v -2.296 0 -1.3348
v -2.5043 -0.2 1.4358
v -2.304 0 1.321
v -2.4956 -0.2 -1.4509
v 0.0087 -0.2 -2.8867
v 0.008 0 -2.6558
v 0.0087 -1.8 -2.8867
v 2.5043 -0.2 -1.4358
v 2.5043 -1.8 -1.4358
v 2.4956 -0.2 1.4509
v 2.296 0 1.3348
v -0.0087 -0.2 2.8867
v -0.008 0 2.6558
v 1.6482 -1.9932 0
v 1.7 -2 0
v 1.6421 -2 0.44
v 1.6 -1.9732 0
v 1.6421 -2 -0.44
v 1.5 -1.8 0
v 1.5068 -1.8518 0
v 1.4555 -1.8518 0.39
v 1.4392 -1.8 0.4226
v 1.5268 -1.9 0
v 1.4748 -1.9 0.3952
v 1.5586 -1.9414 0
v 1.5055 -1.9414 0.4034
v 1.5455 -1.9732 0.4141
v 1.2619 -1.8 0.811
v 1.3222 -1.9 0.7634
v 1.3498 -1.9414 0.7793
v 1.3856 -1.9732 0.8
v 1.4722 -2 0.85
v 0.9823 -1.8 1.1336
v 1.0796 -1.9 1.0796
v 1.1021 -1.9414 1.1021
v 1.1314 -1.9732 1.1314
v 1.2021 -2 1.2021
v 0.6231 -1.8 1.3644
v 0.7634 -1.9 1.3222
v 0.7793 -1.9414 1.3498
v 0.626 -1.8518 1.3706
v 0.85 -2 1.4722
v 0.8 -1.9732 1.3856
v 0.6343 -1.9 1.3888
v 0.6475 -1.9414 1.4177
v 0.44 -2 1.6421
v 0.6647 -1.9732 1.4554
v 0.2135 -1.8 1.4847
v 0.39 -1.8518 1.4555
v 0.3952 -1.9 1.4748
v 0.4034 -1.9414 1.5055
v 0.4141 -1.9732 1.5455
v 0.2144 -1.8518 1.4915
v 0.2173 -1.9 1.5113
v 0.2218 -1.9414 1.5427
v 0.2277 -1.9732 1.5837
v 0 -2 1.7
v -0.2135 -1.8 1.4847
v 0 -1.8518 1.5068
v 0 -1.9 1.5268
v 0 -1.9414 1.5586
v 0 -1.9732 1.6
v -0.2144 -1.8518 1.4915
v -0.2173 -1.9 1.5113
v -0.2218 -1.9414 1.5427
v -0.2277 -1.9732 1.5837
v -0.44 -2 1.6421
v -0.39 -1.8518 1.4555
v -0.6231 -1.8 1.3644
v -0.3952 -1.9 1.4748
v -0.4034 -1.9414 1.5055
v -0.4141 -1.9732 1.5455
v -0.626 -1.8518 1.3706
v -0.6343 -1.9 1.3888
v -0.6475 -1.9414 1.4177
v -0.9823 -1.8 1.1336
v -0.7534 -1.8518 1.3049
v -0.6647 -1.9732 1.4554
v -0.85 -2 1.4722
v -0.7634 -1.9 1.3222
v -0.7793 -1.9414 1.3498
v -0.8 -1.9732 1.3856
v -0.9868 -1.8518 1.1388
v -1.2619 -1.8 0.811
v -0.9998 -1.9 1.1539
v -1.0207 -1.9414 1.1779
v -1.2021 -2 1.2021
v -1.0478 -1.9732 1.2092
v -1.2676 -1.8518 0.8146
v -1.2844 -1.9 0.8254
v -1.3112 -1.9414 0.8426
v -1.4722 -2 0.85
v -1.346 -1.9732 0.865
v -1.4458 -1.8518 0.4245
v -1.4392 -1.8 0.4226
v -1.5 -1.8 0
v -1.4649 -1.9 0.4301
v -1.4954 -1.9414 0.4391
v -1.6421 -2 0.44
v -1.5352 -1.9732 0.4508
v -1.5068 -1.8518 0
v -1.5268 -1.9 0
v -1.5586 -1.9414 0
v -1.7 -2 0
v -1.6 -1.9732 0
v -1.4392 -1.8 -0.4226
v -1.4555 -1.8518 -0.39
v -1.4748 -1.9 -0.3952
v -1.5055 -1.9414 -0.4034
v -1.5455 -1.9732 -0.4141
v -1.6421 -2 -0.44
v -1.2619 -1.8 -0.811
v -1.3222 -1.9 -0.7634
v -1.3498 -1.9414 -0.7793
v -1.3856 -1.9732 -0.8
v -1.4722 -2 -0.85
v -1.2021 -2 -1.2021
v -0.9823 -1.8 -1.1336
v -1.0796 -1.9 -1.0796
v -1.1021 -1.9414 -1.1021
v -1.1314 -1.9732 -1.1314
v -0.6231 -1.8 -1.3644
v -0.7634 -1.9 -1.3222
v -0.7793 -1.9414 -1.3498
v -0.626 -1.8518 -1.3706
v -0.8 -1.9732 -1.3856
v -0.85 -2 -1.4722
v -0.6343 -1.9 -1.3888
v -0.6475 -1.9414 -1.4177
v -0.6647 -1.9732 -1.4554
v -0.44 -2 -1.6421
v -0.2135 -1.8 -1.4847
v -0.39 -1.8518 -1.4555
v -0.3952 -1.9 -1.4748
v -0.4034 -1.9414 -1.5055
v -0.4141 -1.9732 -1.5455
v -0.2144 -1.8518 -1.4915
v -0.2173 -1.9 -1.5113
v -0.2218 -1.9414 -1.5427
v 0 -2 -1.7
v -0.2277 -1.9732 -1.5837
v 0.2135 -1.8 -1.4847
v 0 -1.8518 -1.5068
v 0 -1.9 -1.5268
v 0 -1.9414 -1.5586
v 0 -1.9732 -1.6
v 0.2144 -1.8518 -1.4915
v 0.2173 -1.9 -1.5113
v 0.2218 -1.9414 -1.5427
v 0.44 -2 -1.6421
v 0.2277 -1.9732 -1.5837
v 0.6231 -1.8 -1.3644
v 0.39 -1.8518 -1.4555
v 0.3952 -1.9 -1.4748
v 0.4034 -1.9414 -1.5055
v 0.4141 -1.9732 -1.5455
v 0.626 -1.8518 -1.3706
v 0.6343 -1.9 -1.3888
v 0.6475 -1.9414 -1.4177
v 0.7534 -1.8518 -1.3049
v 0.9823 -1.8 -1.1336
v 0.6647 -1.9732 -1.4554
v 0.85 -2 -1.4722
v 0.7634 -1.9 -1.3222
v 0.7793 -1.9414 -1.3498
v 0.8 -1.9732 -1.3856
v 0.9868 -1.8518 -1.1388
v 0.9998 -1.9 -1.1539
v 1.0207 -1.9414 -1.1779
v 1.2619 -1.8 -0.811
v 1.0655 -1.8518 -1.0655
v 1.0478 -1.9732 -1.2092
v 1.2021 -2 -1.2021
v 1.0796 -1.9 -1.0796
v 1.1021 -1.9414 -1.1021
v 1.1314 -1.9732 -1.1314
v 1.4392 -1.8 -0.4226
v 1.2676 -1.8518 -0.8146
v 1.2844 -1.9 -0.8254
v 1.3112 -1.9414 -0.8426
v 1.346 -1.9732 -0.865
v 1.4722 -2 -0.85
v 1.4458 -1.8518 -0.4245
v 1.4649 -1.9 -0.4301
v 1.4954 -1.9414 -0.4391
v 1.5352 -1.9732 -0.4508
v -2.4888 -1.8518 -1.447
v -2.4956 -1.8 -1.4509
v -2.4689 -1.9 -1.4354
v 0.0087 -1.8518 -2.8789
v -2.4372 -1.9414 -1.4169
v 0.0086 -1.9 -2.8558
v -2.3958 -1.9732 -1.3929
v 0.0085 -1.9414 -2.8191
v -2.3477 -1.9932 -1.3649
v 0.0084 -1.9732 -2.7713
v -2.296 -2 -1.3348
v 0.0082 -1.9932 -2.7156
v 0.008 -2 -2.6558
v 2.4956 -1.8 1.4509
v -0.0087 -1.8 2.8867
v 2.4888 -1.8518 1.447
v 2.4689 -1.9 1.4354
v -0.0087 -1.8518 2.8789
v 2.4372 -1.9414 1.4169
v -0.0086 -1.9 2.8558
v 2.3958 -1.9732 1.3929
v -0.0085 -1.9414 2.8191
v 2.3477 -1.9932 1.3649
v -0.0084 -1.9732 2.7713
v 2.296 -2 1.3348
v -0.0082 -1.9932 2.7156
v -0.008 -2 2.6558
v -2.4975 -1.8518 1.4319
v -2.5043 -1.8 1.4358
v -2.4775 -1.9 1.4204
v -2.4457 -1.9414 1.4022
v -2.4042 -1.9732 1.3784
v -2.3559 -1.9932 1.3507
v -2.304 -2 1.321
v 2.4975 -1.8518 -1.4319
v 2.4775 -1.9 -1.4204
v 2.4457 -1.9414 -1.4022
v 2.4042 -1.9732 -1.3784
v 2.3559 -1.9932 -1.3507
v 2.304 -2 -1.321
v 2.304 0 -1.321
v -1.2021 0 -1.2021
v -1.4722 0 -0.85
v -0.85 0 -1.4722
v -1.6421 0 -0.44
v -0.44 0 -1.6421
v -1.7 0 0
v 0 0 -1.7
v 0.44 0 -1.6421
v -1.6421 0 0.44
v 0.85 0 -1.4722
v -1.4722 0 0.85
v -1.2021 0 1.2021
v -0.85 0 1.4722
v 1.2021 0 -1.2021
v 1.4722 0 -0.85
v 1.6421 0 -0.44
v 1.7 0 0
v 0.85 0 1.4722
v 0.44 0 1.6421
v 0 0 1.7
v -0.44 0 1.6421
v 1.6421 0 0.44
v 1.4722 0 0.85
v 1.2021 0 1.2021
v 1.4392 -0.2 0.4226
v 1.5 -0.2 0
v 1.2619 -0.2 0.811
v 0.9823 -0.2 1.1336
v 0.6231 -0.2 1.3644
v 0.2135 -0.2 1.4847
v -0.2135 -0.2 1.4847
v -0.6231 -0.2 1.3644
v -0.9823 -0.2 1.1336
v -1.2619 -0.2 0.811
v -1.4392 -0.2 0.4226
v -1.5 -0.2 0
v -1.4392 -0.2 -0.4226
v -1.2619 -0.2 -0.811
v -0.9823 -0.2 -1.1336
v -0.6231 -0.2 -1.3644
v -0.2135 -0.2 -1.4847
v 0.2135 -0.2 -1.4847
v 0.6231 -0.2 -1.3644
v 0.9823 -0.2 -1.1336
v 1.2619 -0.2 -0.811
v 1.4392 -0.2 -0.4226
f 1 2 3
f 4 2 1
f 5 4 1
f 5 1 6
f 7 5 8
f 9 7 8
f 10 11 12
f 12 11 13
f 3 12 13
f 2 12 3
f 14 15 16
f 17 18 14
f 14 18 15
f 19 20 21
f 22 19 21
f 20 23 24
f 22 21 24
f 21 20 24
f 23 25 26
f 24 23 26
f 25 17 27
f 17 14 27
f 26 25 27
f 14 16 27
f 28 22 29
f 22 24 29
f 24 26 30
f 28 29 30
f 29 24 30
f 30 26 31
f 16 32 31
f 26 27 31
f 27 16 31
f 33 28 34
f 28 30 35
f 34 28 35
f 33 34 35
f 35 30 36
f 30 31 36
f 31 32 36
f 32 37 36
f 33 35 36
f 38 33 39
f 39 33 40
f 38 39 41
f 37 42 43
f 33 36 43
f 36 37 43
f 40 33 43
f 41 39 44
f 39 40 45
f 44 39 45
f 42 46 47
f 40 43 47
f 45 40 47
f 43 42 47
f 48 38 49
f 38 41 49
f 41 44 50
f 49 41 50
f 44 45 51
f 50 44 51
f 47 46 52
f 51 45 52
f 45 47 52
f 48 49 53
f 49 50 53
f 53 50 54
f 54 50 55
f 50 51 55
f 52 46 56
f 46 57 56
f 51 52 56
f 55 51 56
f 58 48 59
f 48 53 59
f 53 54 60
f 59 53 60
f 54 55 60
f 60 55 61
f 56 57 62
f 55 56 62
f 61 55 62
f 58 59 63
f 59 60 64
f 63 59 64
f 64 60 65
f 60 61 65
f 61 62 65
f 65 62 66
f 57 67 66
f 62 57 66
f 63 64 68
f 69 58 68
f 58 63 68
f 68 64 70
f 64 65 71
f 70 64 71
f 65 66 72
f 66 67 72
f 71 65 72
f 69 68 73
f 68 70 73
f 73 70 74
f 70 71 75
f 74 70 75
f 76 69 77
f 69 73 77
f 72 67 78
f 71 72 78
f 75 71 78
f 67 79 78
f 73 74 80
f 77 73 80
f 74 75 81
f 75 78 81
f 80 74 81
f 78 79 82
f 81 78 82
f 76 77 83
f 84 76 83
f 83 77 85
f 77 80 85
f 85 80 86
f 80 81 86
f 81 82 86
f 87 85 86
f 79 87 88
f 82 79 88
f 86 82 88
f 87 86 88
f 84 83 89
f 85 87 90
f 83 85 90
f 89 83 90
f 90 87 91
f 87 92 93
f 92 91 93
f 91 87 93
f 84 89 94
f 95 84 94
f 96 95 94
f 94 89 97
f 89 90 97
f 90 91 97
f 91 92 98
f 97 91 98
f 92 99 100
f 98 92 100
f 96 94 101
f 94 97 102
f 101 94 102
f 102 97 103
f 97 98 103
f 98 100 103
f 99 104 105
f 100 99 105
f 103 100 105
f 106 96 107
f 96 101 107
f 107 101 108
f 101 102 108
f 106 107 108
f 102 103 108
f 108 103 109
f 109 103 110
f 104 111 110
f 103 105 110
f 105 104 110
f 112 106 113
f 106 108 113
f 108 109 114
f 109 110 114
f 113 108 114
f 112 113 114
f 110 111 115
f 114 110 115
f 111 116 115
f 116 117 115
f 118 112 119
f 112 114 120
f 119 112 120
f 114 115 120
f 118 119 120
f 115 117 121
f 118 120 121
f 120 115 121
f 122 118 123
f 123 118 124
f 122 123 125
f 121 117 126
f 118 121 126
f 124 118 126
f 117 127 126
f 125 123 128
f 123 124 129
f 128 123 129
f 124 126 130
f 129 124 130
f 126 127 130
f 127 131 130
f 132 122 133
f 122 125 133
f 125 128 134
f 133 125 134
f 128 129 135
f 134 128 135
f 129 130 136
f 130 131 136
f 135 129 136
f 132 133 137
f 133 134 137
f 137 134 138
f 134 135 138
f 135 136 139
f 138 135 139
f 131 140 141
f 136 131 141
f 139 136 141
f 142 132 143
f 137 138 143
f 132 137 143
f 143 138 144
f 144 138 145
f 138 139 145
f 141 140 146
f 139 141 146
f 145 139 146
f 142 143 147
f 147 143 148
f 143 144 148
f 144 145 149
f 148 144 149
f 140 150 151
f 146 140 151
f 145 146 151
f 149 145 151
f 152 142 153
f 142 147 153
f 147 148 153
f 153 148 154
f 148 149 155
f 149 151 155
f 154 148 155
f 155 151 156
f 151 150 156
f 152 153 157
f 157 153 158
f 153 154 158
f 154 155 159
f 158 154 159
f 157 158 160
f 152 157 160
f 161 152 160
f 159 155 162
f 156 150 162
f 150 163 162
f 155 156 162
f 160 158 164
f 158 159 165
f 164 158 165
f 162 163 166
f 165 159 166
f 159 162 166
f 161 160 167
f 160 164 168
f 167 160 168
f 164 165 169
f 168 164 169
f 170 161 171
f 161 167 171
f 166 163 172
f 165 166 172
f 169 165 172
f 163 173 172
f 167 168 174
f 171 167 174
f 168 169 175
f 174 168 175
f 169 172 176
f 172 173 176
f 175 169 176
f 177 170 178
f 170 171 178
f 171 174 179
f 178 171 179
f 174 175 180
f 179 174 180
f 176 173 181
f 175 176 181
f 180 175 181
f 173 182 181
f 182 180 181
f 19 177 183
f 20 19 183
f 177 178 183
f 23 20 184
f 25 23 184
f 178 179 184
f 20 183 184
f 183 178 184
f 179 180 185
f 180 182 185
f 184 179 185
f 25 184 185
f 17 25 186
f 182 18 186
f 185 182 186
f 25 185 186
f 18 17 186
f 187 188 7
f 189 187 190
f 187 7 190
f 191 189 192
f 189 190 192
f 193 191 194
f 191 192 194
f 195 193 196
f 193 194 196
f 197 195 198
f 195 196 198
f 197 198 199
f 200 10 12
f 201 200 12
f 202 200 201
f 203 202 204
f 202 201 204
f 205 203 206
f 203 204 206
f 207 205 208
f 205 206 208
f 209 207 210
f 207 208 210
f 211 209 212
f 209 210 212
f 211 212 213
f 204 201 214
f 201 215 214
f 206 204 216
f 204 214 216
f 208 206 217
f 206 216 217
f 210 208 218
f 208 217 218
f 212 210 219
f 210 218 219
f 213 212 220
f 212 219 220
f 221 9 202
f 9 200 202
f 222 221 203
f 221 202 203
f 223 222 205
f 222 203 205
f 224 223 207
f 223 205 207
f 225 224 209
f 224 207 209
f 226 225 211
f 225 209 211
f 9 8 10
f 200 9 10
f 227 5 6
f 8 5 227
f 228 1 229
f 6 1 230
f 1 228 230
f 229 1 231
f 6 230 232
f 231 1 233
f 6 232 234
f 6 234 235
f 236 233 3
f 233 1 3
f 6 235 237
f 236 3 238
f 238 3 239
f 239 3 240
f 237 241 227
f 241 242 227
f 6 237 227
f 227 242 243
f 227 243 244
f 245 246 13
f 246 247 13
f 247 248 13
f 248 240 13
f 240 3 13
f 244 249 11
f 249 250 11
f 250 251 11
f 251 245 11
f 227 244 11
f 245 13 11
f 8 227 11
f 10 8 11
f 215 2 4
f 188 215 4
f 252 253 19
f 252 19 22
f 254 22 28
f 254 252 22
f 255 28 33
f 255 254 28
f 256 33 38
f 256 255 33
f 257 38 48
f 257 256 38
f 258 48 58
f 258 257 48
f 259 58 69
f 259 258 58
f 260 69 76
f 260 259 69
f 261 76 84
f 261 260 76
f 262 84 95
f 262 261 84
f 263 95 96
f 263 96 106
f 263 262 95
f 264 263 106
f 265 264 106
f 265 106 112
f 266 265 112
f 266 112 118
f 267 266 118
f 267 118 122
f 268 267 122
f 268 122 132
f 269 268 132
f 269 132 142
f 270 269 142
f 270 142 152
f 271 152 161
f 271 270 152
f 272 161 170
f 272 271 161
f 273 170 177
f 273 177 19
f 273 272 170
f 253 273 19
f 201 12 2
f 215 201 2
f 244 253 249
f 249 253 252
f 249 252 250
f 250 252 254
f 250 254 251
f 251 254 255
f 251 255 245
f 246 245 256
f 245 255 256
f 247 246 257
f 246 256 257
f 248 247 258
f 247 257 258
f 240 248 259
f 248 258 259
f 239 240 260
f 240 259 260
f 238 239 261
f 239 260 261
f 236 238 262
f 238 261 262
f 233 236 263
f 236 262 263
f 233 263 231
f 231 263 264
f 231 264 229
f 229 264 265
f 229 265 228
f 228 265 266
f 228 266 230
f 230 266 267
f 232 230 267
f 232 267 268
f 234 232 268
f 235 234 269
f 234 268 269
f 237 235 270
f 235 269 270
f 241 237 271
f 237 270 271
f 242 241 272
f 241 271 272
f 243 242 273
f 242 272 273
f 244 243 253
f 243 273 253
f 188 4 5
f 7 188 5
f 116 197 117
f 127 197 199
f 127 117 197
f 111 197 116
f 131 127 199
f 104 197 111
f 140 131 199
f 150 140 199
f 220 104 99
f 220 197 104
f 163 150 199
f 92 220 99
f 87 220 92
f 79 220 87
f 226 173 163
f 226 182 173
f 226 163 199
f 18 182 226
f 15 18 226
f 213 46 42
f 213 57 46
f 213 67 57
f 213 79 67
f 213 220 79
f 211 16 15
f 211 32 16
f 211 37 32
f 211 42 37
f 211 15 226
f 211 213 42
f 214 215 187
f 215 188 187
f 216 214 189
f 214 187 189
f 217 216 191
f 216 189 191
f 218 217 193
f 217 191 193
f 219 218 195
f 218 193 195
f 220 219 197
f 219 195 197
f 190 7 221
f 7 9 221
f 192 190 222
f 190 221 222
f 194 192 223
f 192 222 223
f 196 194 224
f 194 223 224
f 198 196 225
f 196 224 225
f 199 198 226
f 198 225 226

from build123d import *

# Parameters (mm, degrees)
F0_R     = 1.5
F1_DEPTH = 2
F2_R     = 0.2
F3_SIZE  = 0.2


with BuildPart() as f1:
    # F0 (on Front) → F1 (new body)
    with BuildSketch(Plane.XZ):
        Polygon((2.495633, 1.450914), (-0.008712, 2.886738), (-2.504345, 1.435824), (-2.495633, -1.450914), (0.008712, -2.886738), (2.504345, -1.435824), align=None)
        Circle(F0_R, mode=Mode.SUBTRACT)
    extrude(amount=F1_DEPTH)

    # F2
    f2_edges = [f1.edges().sort_by_distance(p)[0] for p in [
        (1.24346, -2, 2.168826),
        (-1.256528, -2, 2.161281),
        (-2.499989, -2, -0.007545),
        (-1.24346, -2, -2.168826),
        (1.256528, -2, -2.161281),
        (2.499989, -2, 0.007545),
        (-1.5, -2, 0),
    ]]
    fillet(f2_edges, radius=F2_R)

    # F3
    f3_edges = [f1.edges().sort_by_distance(p)[0] for p in [
        (1.24346, 0, 2.168826),
        (-1.256528, 0, 2.161281),
        (-2.499989, 0, -0.007545),
        (-1.24346, 0, -2.168826),
        (1.256528, 0, -2.161281),
        (2.499989, 0, 0.007545),
        (-1.5, 0, 0),
    ]]
    chamfer(f3_edges, length=F3_SIZE)


solid = f1.part
